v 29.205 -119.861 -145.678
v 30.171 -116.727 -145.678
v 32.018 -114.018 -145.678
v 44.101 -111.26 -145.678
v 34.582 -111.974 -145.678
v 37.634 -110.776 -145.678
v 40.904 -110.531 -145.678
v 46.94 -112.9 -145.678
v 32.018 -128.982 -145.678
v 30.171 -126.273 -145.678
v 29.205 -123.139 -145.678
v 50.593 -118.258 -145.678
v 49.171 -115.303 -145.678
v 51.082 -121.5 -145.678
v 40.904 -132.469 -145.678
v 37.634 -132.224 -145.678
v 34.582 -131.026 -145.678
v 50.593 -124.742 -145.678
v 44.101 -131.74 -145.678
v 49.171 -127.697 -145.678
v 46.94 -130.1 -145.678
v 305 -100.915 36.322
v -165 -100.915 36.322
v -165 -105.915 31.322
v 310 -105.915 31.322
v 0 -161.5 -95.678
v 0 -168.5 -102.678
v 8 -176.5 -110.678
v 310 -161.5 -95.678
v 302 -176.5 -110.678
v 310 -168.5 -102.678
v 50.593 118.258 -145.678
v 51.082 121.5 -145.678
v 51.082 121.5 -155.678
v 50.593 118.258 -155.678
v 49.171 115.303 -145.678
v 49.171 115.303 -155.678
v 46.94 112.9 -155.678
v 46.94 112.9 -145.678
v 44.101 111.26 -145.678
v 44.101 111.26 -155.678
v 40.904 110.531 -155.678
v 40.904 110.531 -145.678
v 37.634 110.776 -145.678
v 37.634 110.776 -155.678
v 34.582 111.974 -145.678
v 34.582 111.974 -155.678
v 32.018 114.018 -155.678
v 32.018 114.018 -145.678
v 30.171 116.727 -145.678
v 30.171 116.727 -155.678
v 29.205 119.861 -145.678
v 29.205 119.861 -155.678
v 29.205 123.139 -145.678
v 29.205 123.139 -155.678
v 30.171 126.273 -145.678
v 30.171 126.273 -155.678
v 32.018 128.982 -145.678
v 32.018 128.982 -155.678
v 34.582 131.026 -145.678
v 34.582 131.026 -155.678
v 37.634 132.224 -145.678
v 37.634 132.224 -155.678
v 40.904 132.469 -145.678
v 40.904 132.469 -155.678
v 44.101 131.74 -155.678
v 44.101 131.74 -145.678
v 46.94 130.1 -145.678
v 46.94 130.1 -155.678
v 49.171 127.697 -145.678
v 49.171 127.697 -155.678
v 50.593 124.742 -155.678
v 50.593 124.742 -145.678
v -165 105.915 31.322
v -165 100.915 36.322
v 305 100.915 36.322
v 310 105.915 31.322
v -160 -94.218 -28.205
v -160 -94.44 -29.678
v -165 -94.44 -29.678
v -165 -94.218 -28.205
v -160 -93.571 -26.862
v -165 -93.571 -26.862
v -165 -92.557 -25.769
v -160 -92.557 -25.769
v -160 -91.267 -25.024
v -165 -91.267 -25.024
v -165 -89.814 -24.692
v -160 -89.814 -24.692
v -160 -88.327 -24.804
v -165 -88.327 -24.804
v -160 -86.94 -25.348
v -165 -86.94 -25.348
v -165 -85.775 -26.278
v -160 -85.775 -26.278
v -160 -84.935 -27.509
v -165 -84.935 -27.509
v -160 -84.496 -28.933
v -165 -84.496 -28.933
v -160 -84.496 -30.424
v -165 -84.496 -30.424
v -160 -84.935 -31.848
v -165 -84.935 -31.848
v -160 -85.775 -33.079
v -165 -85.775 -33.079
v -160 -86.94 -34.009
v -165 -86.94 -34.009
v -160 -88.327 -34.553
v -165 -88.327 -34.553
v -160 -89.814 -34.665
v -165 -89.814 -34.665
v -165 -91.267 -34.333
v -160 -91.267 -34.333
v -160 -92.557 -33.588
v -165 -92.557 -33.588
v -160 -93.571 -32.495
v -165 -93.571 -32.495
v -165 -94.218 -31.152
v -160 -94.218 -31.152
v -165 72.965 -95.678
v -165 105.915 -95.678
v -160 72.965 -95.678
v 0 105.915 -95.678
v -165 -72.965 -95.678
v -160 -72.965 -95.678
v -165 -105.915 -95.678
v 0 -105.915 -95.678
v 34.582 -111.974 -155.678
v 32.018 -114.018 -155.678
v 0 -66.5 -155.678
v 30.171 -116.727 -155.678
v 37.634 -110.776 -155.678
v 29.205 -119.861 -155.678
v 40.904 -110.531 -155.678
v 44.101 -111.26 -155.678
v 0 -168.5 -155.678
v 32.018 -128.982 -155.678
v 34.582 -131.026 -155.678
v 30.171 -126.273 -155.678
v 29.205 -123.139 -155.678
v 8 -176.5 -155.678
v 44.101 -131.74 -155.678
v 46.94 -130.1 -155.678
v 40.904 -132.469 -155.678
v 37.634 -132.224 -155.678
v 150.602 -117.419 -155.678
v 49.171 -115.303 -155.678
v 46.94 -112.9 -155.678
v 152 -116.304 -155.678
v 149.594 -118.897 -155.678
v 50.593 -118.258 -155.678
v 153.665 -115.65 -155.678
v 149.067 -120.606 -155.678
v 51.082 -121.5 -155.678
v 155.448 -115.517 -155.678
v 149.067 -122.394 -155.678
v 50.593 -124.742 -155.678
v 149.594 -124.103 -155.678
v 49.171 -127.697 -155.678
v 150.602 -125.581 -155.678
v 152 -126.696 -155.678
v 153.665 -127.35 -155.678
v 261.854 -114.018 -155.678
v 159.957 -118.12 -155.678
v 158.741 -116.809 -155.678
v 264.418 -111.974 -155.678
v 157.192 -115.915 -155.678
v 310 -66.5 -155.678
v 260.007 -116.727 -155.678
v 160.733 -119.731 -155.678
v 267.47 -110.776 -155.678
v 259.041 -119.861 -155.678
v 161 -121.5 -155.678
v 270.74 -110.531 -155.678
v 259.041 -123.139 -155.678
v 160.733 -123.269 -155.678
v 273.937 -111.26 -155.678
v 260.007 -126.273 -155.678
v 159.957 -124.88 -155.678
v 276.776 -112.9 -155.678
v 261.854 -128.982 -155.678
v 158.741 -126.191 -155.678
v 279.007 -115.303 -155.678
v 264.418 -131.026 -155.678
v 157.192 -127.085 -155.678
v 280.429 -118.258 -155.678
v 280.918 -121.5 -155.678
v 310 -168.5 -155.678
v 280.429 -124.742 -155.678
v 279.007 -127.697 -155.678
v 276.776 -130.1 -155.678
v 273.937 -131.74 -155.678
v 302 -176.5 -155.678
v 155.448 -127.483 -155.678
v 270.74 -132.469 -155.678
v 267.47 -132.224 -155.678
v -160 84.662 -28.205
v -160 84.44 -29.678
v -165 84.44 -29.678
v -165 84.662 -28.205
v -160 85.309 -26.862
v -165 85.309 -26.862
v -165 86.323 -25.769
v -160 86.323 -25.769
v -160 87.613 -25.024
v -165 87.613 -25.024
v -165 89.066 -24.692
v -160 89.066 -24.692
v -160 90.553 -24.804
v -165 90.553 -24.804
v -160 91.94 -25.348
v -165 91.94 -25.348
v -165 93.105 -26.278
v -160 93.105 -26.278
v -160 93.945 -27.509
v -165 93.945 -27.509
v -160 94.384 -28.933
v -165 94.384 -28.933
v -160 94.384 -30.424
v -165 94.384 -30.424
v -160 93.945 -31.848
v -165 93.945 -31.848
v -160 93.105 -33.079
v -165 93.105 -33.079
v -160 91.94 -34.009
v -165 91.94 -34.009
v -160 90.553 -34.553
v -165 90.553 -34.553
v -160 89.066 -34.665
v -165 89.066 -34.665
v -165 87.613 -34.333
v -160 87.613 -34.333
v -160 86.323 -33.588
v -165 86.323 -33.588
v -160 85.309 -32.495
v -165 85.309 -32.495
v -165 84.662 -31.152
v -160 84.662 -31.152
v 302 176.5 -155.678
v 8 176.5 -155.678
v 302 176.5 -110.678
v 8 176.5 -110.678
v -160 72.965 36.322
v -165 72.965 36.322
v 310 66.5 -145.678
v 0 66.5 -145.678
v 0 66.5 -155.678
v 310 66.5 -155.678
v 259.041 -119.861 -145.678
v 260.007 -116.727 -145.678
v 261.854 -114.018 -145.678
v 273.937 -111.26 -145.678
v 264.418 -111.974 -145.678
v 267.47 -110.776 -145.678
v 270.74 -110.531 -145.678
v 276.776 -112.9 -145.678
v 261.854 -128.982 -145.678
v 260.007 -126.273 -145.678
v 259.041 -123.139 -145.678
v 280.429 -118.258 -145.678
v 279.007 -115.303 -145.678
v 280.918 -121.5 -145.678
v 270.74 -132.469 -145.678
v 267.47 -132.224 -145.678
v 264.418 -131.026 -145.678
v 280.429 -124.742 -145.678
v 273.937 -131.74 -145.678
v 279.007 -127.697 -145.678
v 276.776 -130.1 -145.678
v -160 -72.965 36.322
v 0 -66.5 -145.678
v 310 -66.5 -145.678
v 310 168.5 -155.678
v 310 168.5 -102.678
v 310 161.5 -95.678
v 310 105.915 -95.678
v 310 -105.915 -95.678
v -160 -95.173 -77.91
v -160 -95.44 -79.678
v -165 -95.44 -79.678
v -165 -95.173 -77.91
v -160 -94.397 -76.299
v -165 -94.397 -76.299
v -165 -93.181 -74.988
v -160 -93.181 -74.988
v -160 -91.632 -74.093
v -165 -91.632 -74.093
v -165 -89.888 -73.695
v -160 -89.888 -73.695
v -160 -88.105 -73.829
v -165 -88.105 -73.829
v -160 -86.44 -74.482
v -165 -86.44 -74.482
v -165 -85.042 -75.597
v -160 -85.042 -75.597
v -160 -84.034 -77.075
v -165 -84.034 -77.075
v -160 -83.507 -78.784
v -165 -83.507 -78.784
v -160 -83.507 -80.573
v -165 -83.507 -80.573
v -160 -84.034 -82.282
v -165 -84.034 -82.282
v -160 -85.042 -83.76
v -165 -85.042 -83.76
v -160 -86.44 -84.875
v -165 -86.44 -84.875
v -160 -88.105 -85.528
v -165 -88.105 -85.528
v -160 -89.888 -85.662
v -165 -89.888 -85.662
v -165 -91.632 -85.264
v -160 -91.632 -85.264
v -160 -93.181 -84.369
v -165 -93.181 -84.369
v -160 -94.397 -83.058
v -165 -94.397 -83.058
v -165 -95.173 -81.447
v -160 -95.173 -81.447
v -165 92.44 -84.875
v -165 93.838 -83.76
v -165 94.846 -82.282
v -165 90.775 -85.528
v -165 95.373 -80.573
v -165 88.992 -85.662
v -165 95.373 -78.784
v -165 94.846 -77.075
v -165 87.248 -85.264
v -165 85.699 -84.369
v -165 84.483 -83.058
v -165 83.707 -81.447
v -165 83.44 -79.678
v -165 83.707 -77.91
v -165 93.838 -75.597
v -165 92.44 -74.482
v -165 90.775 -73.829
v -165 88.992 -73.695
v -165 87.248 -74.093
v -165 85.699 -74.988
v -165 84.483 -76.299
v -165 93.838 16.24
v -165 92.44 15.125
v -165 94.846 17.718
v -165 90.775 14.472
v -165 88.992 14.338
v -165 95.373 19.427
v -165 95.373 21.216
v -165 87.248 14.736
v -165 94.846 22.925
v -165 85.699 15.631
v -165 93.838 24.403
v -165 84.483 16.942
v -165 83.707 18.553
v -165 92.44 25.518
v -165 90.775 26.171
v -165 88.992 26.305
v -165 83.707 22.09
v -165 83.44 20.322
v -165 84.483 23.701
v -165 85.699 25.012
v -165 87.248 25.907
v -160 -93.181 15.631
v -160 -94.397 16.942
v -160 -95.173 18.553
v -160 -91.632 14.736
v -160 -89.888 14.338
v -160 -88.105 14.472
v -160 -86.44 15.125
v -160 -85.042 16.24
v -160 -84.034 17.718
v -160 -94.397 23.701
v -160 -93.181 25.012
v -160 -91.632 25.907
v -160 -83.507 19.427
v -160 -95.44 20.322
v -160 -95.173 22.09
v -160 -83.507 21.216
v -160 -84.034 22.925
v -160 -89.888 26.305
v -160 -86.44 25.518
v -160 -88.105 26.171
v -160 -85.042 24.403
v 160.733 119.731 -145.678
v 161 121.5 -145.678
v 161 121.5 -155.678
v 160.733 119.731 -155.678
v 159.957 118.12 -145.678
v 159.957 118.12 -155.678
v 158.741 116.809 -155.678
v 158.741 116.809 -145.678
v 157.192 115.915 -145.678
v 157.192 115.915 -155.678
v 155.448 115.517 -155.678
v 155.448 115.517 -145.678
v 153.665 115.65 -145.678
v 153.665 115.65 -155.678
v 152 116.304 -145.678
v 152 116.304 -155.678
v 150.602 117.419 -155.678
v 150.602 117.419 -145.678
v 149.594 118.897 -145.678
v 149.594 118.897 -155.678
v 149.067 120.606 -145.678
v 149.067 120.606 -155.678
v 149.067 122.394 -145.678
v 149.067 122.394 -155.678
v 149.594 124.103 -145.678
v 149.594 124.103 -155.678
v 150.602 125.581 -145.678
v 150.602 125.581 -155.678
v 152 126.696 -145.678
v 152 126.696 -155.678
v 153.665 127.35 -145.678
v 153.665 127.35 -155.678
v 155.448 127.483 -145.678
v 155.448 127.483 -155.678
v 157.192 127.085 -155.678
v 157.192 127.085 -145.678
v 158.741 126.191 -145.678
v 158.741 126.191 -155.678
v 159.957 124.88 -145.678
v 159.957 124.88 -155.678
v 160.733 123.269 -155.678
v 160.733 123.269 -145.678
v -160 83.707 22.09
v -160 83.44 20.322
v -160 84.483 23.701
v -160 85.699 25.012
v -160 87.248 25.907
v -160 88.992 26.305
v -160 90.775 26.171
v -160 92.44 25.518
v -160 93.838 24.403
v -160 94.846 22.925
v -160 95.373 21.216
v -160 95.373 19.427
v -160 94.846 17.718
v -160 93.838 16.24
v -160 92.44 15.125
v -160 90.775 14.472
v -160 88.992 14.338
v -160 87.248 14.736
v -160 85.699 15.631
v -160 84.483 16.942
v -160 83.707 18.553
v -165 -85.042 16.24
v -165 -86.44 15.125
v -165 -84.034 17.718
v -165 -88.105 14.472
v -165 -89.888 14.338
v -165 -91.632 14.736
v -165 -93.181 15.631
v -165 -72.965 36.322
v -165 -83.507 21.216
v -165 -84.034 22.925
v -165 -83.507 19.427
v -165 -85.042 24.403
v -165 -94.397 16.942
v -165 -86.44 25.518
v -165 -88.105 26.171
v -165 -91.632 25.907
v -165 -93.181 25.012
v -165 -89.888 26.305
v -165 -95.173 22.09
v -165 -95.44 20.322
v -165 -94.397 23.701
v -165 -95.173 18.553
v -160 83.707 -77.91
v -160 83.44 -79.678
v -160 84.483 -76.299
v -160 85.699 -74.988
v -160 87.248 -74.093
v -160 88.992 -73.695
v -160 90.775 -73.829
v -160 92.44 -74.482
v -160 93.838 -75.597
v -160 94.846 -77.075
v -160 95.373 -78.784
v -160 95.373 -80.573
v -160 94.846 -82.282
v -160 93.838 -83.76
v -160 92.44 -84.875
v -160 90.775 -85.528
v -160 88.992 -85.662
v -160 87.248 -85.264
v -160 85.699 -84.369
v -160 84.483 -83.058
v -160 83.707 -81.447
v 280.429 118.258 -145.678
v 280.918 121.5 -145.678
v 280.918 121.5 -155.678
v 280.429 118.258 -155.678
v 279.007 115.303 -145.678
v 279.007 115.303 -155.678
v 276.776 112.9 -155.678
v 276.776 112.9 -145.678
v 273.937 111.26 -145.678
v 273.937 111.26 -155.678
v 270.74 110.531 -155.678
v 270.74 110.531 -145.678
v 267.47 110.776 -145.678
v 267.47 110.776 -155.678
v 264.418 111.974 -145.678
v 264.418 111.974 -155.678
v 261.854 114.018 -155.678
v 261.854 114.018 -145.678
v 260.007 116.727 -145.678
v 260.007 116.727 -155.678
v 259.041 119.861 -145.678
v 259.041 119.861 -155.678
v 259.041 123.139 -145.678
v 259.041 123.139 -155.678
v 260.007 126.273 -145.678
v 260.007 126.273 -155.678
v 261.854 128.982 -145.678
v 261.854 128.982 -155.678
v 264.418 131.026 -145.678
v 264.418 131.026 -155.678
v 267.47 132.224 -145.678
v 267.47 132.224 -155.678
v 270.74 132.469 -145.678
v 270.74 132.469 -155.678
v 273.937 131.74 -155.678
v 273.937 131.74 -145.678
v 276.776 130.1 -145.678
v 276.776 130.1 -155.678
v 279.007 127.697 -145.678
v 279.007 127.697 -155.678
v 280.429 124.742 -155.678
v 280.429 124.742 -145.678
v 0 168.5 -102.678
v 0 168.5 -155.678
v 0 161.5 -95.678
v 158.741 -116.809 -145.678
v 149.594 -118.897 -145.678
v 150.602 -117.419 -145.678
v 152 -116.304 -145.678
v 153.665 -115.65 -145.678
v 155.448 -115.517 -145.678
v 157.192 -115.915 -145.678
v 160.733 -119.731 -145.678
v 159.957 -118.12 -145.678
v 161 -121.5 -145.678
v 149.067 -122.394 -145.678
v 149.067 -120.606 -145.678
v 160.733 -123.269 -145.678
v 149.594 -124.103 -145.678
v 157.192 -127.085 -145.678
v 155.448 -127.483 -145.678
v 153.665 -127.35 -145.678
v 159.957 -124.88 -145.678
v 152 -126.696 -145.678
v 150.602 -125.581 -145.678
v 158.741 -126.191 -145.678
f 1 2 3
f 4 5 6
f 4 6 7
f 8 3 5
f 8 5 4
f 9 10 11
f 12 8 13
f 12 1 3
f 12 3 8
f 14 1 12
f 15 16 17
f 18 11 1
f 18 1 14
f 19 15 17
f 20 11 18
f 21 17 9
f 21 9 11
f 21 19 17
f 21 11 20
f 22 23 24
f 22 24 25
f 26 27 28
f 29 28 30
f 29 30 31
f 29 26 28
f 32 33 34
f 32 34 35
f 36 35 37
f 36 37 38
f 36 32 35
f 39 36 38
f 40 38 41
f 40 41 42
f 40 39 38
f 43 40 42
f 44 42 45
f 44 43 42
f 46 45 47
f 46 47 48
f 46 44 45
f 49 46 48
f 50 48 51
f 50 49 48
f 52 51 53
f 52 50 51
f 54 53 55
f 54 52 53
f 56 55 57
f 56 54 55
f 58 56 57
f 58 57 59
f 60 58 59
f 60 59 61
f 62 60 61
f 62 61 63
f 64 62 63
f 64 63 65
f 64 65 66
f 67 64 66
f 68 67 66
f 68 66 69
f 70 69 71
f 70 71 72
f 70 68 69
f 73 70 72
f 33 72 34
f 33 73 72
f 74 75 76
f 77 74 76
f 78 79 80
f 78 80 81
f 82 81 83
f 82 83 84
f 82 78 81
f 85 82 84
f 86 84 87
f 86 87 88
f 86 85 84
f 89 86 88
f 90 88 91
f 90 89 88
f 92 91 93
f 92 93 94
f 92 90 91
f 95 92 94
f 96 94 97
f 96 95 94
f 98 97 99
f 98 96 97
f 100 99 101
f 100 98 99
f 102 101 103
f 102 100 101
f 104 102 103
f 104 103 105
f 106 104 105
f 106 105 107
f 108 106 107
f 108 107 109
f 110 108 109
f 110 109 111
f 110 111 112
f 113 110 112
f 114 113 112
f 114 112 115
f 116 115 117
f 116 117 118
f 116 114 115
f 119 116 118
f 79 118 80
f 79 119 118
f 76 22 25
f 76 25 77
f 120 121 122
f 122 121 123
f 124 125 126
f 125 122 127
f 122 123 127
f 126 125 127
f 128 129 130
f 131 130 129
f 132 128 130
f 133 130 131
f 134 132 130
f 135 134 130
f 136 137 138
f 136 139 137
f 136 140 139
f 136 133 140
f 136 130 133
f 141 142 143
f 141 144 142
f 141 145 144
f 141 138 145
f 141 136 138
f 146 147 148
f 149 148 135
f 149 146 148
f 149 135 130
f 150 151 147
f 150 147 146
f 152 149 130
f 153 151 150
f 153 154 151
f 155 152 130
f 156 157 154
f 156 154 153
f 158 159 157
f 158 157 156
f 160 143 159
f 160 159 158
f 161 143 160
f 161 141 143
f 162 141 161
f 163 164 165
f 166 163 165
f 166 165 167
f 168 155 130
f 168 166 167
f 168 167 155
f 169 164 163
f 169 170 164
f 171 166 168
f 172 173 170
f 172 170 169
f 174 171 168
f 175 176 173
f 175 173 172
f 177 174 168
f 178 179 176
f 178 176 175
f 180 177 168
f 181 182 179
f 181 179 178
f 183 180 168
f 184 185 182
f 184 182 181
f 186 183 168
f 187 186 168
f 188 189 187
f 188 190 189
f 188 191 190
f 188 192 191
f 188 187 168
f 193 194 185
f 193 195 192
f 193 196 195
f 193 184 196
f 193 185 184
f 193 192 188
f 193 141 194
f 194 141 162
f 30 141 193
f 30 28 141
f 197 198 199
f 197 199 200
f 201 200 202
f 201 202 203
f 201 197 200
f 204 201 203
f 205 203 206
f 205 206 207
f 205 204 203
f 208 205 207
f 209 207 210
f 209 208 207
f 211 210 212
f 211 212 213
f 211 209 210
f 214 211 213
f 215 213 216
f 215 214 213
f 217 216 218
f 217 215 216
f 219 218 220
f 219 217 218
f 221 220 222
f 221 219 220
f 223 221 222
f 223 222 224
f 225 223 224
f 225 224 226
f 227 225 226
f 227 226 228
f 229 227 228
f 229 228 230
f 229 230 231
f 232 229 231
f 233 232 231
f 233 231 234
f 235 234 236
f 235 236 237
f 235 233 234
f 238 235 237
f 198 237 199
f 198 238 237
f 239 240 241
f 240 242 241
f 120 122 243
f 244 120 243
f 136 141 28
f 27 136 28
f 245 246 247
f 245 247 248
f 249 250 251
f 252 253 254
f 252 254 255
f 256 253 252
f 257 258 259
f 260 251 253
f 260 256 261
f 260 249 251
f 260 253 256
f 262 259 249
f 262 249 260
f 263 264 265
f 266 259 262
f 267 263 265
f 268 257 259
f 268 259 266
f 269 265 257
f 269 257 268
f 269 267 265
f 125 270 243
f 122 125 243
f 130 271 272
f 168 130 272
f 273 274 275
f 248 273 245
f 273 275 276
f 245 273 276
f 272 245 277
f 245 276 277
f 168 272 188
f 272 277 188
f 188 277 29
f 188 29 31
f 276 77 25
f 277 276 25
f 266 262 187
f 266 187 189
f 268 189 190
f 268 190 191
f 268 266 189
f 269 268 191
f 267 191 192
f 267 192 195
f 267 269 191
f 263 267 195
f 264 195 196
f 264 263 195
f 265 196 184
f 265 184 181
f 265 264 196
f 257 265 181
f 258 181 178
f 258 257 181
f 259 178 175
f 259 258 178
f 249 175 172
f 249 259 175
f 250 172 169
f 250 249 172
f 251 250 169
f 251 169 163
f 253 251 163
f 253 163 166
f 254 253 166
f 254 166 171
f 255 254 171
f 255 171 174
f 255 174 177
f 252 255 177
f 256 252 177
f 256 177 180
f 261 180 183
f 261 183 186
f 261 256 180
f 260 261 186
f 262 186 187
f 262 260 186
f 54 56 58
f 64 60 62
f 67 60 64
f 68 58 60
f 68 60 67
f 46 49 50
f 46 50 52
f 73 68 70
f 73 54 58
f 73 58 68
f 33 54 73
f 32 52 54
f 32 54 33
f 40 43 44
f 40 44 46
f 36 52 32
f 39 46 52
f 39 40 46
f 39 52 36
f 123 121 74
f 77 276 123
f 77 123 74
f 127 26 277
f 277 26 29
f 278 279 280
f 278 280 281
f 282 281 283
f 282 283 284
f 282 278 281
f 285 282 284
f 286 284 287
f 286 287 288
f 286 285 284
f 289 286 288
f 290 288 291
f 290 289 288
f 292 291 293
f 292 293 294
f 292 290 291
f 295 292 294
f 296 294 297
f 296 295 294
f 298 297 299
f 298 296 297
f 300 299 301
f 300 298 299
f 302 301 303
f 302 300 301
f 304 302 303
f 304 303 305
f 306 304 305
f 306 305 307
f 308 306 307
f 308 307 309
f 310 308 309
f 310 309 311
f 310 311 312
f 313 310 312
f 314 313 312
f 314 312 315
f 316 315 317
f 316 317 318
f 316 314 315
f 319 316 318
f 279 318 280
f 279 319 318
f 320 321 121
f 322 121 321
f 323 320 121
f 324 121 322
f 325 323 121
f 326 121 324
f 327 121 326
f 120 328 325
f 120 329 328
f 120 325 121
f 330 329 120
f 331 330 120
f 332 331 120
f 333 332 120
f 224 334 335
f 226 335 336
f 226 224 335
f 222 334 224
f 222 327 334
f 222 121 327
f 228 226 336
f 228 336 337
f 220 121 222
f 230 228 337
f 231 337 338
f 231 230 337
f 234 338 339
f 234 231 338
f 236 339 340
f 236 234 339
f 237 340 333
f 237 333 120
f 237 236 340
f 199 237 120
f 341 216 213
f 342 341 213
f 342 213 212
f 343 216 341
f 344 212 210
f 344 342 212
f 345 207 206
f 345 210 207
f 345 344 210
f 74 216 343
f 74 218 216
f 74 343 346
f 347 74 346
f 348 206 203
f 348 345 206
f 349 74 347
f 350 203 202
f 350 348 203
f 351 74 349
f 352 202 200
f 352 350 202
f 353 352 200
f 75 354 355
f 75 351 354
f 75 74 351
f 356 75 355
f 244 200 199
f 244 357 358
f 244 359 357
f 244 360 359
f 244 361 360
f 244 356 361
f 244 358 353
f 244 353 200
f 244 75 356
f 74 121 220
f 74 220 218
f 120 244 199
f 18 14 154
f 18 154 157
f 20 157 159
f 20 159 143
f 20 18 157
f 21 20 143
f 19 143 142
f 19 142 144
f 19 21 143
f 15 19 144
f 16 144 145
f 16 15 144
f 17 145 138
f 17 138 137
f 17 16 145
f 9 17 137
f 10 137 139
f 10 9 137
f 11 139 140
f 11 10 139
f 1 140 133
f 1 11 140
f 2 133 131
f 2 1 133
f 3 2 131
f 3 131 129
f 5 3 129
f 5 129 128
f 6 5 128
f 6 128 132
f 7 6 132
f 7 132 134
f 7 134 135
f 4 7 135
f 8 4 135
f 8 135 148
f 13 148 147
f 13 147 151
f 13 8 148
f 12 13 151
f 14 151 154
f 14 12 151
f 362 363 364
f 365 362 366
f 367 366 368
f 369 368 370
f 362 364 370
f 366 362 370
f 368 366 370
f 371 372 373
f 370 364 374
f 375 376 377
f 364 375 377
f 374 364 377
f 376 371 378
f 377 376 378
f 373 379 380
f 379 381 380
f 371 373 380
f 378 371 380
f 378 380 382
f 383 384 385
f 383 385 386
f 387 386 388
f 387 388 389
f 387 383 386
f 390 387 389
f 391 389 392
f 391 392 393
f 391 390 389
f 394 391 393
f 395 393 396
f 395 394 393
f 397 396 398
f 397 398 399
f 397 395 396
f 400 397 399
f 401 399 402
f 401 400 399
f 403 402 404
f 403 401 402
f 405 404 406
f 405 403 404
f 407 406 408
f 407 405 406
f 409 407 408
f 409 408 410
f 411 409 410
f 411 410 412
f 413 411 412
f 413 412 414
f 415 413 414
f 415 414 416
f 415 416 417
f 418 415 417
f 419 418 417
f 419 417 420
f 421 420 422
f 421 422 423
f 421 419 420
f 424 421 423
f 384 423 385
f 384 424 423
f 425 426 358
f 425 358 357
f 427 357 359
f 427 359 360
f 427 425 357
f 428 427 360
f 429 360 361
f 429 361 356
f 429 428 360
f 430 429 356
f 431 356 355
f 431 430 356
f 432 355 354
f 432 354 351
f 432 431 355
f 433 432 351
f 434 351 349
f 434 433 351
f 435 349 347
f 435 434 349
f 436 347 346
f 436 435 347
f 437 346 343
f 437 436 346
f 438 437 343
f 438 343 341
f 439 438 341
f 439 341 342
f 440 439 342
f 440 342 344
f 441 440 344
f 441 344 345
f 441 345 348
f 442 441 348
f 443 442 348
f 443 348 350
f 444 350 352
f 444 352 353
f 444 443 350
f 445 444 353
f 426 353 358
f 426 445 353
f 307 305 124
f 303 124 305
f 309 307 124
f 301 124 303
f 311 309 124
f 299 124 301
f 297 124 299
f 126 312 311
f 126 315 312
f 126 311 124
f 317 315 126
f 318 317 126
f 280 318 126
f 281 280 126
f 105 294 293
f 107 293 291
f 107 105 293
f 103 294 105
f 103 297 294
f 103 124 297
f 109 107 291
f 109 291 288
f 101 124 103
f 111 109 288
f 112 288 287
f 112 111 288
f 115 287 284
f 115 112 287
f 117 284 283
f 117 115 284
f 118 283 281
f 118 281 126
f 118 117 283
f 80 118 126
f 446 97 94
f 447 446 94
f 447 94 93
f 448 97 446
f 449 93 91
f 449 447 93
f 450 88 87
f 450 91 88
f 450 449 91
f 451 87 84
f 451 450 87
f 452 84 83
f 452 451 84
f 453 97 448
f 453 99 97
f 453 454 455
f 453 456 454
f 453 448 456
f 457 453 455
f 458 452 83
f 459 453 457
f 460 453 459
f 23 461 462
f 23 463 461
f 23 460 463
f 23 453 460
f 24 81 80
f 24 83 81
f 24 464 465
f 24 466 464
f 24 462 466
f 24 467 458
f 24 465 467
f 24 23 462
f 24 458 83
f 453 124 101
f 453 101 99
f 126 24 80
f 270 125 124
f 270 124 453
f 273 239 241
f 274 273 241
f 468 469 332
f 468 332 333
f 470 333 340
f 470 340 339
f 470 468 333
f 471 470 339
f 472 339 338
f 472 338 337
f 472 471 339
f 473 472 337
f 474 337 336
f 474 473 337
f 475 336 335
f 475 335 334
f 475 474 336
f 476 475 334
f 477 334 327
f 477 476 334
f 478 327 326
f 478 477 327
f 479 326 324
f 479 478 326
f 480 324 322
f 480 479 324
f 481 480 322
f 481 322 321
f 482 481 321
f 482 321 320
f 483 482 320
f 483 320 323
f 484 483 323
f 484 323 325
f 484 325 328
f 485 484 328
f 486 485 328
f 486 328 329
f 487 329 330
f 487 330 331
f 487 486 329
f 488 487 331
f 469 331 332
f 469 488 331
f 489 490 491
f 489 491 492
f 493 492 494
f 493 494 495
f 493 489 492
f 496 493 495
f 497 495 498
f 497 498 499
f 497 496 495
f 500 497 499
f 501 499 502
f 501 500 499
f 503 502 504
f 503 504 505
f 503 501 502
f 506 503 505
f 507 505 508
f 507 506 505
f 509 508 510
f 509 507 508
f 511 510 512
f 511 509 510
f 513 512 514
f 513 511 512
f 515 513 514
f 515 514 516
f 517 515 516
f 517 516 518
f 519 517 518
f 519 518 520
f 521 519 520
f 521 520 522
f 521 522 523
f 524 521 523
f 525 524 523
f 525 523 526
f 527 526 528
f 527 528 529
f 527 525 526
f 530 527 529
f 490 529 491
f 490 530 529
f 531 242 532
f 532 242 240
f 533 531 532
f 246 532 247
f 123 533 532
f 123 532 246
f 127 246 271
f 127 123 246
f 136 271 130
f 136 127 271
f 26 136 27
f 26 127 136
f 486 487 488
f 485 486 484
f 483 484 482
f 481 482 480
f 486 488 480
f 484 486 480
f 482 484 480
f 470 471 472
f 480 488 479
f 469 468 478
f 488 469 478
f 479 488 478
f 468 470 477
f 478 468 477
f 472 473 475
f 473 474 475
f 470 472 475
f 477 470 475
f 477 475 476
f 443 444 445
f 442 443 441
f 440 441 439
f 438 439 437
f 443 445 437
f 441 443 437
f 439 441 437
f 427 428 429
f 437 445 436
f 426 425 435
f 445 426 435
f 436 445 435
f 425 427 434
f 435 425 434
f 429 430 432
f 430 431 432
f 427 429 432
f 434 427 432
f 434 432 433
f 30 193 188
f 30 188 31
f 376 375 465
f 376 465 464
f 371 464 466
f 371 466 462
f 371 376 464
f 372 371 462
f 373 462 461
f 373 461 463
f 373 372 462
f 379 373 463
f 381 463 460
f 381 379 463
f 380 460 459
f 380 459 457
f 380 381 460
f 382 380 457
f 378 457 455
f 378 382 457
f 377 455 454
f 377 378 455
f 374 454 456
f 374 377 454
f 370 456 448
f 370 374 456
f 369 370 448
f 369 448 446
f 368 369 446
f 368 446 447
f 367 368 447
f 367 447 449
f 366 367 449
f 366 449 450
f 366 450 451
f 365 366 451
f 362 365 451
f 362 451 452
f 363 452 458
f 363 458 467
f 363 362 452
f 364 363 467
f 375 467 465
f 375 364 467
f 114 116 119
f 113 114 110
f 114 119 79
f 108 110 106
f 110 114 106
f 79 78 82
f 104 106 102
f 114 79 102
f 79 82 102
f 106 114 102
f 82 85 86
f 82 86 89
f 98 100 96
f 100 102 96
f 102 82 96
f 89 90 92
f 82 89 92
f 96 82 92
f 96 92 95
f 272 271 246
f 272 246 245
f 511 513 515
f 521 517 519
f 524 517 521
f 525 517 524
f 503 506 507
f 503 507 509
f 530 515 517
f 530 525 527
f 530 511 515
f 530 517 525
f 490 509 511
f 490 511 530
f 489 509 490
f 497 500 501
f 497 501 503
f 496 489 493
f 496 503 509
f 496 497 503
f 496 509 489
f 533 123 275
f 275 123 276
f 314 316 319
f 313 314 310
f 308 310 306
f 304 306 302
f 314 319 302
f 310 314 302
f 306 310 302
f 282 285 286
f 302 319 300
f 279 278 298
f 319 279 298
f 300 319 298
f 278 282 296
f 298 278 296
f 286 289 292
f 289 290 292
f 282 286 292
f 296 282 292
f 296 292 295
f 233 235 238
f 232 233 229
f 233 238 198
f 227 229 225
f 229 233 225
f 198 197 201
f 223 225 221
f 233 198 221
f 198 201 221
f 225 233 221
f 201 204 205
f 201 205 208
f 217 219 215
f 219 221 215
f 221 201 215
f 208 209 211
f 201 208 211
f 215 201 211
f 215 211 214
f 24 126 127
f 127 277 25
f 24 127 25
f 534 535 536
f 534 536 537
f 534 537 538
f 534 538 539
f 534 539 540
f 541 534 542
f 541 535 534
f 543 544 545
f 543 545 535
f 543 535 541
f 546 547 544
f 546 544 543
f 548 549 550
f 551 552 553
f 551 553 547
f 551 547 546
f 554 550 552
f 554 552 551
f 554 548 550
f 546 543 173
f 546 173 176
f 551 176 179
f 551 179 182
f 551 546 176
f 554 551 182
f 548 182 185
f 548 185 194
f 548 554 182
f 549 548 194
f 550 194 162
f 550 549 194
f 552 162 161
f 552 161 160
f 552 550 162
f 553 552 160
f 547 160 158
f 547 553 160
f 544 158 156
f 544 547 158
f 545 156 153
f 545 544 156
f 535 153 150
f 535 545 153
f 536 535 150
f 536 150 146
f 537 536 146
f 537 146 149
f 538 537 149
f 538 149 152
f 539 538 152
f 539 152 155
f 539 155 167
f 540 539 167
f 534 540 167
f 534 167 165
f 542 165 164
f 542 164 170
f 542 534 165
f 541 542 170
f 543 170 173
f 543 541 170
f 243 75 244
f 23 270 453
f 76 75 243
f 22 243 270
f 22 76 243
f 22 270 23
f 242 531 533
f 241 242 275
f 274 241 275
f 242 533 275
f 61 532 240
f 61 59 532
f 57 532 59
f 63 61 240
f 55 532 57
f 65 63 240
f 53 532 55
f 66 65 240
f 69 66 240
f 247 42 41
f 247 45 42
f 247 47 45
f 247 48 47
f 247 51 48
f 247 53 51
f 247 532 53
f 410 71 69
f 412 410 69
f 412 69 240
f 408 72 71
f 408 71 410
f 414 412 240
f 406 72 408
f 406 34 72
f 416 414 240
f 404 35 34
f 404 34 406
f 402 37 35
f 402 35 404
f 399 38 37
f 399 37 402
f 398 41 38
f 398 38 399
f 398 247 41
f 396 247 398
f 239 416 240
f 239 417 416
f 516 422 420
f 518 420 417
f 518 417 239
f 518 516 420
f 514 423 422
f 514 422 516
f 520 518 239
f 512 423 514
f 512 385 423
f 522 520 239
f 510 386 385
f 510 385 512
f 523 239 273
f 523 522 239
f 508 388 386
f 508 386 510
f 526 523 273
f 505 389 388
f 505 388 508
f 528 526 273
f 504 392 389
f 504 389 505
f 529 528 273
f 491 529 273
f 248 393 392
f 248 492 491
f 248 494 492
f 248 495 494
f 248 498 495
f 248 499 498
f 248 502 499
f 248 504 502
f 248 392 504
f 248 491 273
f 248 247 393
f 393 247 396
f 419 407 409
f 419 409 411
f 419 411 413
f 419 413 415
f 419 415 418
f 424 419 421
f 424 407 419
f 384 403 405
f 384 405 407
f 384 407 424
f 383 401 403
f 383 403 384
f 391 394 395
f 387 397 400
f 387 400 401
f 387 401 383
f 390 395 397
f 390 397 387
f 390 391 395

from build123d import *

# Parameters (mm, degrees)
F0_W          = 211.83
F0_H          = 132
F1_DEPTH      = 310
F1_DEPTH_BACK = 160
F2_W          = 32.95
F2_H          = 132
F2_R          = 6
F2_R_2        = 5
F3_DEPTH      = 5
F4_SIZE       = 5
F5_W          = 310
F5_H          = 353
F6_DEPTH      = 50
F7_SIZE       = 15
F8_W          = 310
F8_H          = 110
F8_R          = 11
F8_R_2        = 6
F9_DEPTH      = 10
F10_SIZE      = 8


with BuildPart() as f1:
    # F0 (on Right) → F1 (new body, two sides)
    with BuildSketch(Plane.YZ) as f1_sk:
        with Locations((0, -29.678499)):
            Rectangle(F0_W, F0_H)
    extrude(amount=F1_DEPTH)
    extrude(f1_sk.sketch, amount=-F1_DEPTH_BACK)

    # F2 (on face) → F3 (join)
    with BuildSketch(Plane(origin=(-160, 0, 0), x_dir=(0, -1, 0), z_dir=(-1, 0, 0))):
        with Locations((-89.44, -29.678499)):
            Rectangle(F2_W, F2_H)
        with Locations((-89.44, -79.678499)):
            Circle(F2_R, mode=Mode.SUBTRACT)
        with Locations((-89.44, -29.678499)):
            Circle(F2_R_2, mode=Mode.SUBTRACT)
        with Locations((-89.44, 20.321501)):
            Circle(F2_R, mode=Mode.SUBTRACT)
        with Locations((89.44, -29.678499)):
            Rectangle(F2_W, F2_H)
        with Locations((89.44, -79.678499)):
            Circle(F2_R, mode=Mode.SUBTRACT)
        with Locations((89.44, -29.678499)):
            Circle(F2_R_2, mode=Mode.SUBTRACT)
        with Locations((89.44, 20.321501)):
            Circle(F2_R, mode=Mode.SUBTRACT)
    extrude(amount=F3_DEPTH)

    # F4
    f4_edges = [f1.edges().sort_by_distance(p)[0] for p in [
        (310, 0, 36.321501),
        (72.5, -105.915, 36.321501),
        (72.5, 105.915, 36.321501),
    ]]
    chamfer(f4_edges, length=F4_SIZE)

    # F5 (on face) → F6 (join)
    with BuildSketch(Plane(origin=(0, 0, -95.678499), x_dir=(1, 0, 0), z_dir=(0, 0, -1))):
        with Locations((155, 0)):
            Rectangle(F5_W, F5_H)
    extrude(amount=F6_DEPTH)

    # F7
    f7_edges = [f1.edges().sort_by_distance(p)[0] for p in [
        (155, -176.5, -95.678499),
        (155, 176.5, -95.678499),
    ]]
    chamfer(f7_edges, length=F7_SIZE)

    # F8 (on face) → F9 (join)
    with BuildSketch(Plane(origin=(0, 0, -145.678499), x_dir=(1, 0, 0), z_dir=(0, 0, -1))):
        with Locations((155, 121.5)):
            Rectangle(F8_W, F8_H)
        with Locations((40.08206, 121.5)):
            Circle(F8_R, mode=Mode.SUBTRACT)
        with Locations((155, 121.5)):
            Circle(F8_R_2, mode=Mode.SUBTRACT)
        with Locations((269.91794, 121.5)):
            Circle(F8_R, mode=Mode.SUBTRACT)
        with Locations((155, -121.5)):
            Rectangle(F8_W, F8_H)
        with Locations((40.08206, -121.5)):
            Circle(F8_R, mode=Mode.SUBTRACT)
        with Locations((155, -121.5)):
            Circle(F8_R_2, mode=Mode.SUBTRACT)
        with Locations((269.91794, -121.5)):
            Circle(F8_R, mode=Mode.SUBTRACT)
    extrude(amount=F9_DEPTH)

    # F10
    f10_edges = [f1.edges().sort_by_distance(p)[0] for p in [
        (0, -176.5, -133.178499),
        (0, 176.5, -133.178499),
        (310, 176.5, -133.178499),
        (310, -176.5, -133.178499),
    ]]
    chamfer(f10_edges, length=F10_SIZE)


solid = f1.part
